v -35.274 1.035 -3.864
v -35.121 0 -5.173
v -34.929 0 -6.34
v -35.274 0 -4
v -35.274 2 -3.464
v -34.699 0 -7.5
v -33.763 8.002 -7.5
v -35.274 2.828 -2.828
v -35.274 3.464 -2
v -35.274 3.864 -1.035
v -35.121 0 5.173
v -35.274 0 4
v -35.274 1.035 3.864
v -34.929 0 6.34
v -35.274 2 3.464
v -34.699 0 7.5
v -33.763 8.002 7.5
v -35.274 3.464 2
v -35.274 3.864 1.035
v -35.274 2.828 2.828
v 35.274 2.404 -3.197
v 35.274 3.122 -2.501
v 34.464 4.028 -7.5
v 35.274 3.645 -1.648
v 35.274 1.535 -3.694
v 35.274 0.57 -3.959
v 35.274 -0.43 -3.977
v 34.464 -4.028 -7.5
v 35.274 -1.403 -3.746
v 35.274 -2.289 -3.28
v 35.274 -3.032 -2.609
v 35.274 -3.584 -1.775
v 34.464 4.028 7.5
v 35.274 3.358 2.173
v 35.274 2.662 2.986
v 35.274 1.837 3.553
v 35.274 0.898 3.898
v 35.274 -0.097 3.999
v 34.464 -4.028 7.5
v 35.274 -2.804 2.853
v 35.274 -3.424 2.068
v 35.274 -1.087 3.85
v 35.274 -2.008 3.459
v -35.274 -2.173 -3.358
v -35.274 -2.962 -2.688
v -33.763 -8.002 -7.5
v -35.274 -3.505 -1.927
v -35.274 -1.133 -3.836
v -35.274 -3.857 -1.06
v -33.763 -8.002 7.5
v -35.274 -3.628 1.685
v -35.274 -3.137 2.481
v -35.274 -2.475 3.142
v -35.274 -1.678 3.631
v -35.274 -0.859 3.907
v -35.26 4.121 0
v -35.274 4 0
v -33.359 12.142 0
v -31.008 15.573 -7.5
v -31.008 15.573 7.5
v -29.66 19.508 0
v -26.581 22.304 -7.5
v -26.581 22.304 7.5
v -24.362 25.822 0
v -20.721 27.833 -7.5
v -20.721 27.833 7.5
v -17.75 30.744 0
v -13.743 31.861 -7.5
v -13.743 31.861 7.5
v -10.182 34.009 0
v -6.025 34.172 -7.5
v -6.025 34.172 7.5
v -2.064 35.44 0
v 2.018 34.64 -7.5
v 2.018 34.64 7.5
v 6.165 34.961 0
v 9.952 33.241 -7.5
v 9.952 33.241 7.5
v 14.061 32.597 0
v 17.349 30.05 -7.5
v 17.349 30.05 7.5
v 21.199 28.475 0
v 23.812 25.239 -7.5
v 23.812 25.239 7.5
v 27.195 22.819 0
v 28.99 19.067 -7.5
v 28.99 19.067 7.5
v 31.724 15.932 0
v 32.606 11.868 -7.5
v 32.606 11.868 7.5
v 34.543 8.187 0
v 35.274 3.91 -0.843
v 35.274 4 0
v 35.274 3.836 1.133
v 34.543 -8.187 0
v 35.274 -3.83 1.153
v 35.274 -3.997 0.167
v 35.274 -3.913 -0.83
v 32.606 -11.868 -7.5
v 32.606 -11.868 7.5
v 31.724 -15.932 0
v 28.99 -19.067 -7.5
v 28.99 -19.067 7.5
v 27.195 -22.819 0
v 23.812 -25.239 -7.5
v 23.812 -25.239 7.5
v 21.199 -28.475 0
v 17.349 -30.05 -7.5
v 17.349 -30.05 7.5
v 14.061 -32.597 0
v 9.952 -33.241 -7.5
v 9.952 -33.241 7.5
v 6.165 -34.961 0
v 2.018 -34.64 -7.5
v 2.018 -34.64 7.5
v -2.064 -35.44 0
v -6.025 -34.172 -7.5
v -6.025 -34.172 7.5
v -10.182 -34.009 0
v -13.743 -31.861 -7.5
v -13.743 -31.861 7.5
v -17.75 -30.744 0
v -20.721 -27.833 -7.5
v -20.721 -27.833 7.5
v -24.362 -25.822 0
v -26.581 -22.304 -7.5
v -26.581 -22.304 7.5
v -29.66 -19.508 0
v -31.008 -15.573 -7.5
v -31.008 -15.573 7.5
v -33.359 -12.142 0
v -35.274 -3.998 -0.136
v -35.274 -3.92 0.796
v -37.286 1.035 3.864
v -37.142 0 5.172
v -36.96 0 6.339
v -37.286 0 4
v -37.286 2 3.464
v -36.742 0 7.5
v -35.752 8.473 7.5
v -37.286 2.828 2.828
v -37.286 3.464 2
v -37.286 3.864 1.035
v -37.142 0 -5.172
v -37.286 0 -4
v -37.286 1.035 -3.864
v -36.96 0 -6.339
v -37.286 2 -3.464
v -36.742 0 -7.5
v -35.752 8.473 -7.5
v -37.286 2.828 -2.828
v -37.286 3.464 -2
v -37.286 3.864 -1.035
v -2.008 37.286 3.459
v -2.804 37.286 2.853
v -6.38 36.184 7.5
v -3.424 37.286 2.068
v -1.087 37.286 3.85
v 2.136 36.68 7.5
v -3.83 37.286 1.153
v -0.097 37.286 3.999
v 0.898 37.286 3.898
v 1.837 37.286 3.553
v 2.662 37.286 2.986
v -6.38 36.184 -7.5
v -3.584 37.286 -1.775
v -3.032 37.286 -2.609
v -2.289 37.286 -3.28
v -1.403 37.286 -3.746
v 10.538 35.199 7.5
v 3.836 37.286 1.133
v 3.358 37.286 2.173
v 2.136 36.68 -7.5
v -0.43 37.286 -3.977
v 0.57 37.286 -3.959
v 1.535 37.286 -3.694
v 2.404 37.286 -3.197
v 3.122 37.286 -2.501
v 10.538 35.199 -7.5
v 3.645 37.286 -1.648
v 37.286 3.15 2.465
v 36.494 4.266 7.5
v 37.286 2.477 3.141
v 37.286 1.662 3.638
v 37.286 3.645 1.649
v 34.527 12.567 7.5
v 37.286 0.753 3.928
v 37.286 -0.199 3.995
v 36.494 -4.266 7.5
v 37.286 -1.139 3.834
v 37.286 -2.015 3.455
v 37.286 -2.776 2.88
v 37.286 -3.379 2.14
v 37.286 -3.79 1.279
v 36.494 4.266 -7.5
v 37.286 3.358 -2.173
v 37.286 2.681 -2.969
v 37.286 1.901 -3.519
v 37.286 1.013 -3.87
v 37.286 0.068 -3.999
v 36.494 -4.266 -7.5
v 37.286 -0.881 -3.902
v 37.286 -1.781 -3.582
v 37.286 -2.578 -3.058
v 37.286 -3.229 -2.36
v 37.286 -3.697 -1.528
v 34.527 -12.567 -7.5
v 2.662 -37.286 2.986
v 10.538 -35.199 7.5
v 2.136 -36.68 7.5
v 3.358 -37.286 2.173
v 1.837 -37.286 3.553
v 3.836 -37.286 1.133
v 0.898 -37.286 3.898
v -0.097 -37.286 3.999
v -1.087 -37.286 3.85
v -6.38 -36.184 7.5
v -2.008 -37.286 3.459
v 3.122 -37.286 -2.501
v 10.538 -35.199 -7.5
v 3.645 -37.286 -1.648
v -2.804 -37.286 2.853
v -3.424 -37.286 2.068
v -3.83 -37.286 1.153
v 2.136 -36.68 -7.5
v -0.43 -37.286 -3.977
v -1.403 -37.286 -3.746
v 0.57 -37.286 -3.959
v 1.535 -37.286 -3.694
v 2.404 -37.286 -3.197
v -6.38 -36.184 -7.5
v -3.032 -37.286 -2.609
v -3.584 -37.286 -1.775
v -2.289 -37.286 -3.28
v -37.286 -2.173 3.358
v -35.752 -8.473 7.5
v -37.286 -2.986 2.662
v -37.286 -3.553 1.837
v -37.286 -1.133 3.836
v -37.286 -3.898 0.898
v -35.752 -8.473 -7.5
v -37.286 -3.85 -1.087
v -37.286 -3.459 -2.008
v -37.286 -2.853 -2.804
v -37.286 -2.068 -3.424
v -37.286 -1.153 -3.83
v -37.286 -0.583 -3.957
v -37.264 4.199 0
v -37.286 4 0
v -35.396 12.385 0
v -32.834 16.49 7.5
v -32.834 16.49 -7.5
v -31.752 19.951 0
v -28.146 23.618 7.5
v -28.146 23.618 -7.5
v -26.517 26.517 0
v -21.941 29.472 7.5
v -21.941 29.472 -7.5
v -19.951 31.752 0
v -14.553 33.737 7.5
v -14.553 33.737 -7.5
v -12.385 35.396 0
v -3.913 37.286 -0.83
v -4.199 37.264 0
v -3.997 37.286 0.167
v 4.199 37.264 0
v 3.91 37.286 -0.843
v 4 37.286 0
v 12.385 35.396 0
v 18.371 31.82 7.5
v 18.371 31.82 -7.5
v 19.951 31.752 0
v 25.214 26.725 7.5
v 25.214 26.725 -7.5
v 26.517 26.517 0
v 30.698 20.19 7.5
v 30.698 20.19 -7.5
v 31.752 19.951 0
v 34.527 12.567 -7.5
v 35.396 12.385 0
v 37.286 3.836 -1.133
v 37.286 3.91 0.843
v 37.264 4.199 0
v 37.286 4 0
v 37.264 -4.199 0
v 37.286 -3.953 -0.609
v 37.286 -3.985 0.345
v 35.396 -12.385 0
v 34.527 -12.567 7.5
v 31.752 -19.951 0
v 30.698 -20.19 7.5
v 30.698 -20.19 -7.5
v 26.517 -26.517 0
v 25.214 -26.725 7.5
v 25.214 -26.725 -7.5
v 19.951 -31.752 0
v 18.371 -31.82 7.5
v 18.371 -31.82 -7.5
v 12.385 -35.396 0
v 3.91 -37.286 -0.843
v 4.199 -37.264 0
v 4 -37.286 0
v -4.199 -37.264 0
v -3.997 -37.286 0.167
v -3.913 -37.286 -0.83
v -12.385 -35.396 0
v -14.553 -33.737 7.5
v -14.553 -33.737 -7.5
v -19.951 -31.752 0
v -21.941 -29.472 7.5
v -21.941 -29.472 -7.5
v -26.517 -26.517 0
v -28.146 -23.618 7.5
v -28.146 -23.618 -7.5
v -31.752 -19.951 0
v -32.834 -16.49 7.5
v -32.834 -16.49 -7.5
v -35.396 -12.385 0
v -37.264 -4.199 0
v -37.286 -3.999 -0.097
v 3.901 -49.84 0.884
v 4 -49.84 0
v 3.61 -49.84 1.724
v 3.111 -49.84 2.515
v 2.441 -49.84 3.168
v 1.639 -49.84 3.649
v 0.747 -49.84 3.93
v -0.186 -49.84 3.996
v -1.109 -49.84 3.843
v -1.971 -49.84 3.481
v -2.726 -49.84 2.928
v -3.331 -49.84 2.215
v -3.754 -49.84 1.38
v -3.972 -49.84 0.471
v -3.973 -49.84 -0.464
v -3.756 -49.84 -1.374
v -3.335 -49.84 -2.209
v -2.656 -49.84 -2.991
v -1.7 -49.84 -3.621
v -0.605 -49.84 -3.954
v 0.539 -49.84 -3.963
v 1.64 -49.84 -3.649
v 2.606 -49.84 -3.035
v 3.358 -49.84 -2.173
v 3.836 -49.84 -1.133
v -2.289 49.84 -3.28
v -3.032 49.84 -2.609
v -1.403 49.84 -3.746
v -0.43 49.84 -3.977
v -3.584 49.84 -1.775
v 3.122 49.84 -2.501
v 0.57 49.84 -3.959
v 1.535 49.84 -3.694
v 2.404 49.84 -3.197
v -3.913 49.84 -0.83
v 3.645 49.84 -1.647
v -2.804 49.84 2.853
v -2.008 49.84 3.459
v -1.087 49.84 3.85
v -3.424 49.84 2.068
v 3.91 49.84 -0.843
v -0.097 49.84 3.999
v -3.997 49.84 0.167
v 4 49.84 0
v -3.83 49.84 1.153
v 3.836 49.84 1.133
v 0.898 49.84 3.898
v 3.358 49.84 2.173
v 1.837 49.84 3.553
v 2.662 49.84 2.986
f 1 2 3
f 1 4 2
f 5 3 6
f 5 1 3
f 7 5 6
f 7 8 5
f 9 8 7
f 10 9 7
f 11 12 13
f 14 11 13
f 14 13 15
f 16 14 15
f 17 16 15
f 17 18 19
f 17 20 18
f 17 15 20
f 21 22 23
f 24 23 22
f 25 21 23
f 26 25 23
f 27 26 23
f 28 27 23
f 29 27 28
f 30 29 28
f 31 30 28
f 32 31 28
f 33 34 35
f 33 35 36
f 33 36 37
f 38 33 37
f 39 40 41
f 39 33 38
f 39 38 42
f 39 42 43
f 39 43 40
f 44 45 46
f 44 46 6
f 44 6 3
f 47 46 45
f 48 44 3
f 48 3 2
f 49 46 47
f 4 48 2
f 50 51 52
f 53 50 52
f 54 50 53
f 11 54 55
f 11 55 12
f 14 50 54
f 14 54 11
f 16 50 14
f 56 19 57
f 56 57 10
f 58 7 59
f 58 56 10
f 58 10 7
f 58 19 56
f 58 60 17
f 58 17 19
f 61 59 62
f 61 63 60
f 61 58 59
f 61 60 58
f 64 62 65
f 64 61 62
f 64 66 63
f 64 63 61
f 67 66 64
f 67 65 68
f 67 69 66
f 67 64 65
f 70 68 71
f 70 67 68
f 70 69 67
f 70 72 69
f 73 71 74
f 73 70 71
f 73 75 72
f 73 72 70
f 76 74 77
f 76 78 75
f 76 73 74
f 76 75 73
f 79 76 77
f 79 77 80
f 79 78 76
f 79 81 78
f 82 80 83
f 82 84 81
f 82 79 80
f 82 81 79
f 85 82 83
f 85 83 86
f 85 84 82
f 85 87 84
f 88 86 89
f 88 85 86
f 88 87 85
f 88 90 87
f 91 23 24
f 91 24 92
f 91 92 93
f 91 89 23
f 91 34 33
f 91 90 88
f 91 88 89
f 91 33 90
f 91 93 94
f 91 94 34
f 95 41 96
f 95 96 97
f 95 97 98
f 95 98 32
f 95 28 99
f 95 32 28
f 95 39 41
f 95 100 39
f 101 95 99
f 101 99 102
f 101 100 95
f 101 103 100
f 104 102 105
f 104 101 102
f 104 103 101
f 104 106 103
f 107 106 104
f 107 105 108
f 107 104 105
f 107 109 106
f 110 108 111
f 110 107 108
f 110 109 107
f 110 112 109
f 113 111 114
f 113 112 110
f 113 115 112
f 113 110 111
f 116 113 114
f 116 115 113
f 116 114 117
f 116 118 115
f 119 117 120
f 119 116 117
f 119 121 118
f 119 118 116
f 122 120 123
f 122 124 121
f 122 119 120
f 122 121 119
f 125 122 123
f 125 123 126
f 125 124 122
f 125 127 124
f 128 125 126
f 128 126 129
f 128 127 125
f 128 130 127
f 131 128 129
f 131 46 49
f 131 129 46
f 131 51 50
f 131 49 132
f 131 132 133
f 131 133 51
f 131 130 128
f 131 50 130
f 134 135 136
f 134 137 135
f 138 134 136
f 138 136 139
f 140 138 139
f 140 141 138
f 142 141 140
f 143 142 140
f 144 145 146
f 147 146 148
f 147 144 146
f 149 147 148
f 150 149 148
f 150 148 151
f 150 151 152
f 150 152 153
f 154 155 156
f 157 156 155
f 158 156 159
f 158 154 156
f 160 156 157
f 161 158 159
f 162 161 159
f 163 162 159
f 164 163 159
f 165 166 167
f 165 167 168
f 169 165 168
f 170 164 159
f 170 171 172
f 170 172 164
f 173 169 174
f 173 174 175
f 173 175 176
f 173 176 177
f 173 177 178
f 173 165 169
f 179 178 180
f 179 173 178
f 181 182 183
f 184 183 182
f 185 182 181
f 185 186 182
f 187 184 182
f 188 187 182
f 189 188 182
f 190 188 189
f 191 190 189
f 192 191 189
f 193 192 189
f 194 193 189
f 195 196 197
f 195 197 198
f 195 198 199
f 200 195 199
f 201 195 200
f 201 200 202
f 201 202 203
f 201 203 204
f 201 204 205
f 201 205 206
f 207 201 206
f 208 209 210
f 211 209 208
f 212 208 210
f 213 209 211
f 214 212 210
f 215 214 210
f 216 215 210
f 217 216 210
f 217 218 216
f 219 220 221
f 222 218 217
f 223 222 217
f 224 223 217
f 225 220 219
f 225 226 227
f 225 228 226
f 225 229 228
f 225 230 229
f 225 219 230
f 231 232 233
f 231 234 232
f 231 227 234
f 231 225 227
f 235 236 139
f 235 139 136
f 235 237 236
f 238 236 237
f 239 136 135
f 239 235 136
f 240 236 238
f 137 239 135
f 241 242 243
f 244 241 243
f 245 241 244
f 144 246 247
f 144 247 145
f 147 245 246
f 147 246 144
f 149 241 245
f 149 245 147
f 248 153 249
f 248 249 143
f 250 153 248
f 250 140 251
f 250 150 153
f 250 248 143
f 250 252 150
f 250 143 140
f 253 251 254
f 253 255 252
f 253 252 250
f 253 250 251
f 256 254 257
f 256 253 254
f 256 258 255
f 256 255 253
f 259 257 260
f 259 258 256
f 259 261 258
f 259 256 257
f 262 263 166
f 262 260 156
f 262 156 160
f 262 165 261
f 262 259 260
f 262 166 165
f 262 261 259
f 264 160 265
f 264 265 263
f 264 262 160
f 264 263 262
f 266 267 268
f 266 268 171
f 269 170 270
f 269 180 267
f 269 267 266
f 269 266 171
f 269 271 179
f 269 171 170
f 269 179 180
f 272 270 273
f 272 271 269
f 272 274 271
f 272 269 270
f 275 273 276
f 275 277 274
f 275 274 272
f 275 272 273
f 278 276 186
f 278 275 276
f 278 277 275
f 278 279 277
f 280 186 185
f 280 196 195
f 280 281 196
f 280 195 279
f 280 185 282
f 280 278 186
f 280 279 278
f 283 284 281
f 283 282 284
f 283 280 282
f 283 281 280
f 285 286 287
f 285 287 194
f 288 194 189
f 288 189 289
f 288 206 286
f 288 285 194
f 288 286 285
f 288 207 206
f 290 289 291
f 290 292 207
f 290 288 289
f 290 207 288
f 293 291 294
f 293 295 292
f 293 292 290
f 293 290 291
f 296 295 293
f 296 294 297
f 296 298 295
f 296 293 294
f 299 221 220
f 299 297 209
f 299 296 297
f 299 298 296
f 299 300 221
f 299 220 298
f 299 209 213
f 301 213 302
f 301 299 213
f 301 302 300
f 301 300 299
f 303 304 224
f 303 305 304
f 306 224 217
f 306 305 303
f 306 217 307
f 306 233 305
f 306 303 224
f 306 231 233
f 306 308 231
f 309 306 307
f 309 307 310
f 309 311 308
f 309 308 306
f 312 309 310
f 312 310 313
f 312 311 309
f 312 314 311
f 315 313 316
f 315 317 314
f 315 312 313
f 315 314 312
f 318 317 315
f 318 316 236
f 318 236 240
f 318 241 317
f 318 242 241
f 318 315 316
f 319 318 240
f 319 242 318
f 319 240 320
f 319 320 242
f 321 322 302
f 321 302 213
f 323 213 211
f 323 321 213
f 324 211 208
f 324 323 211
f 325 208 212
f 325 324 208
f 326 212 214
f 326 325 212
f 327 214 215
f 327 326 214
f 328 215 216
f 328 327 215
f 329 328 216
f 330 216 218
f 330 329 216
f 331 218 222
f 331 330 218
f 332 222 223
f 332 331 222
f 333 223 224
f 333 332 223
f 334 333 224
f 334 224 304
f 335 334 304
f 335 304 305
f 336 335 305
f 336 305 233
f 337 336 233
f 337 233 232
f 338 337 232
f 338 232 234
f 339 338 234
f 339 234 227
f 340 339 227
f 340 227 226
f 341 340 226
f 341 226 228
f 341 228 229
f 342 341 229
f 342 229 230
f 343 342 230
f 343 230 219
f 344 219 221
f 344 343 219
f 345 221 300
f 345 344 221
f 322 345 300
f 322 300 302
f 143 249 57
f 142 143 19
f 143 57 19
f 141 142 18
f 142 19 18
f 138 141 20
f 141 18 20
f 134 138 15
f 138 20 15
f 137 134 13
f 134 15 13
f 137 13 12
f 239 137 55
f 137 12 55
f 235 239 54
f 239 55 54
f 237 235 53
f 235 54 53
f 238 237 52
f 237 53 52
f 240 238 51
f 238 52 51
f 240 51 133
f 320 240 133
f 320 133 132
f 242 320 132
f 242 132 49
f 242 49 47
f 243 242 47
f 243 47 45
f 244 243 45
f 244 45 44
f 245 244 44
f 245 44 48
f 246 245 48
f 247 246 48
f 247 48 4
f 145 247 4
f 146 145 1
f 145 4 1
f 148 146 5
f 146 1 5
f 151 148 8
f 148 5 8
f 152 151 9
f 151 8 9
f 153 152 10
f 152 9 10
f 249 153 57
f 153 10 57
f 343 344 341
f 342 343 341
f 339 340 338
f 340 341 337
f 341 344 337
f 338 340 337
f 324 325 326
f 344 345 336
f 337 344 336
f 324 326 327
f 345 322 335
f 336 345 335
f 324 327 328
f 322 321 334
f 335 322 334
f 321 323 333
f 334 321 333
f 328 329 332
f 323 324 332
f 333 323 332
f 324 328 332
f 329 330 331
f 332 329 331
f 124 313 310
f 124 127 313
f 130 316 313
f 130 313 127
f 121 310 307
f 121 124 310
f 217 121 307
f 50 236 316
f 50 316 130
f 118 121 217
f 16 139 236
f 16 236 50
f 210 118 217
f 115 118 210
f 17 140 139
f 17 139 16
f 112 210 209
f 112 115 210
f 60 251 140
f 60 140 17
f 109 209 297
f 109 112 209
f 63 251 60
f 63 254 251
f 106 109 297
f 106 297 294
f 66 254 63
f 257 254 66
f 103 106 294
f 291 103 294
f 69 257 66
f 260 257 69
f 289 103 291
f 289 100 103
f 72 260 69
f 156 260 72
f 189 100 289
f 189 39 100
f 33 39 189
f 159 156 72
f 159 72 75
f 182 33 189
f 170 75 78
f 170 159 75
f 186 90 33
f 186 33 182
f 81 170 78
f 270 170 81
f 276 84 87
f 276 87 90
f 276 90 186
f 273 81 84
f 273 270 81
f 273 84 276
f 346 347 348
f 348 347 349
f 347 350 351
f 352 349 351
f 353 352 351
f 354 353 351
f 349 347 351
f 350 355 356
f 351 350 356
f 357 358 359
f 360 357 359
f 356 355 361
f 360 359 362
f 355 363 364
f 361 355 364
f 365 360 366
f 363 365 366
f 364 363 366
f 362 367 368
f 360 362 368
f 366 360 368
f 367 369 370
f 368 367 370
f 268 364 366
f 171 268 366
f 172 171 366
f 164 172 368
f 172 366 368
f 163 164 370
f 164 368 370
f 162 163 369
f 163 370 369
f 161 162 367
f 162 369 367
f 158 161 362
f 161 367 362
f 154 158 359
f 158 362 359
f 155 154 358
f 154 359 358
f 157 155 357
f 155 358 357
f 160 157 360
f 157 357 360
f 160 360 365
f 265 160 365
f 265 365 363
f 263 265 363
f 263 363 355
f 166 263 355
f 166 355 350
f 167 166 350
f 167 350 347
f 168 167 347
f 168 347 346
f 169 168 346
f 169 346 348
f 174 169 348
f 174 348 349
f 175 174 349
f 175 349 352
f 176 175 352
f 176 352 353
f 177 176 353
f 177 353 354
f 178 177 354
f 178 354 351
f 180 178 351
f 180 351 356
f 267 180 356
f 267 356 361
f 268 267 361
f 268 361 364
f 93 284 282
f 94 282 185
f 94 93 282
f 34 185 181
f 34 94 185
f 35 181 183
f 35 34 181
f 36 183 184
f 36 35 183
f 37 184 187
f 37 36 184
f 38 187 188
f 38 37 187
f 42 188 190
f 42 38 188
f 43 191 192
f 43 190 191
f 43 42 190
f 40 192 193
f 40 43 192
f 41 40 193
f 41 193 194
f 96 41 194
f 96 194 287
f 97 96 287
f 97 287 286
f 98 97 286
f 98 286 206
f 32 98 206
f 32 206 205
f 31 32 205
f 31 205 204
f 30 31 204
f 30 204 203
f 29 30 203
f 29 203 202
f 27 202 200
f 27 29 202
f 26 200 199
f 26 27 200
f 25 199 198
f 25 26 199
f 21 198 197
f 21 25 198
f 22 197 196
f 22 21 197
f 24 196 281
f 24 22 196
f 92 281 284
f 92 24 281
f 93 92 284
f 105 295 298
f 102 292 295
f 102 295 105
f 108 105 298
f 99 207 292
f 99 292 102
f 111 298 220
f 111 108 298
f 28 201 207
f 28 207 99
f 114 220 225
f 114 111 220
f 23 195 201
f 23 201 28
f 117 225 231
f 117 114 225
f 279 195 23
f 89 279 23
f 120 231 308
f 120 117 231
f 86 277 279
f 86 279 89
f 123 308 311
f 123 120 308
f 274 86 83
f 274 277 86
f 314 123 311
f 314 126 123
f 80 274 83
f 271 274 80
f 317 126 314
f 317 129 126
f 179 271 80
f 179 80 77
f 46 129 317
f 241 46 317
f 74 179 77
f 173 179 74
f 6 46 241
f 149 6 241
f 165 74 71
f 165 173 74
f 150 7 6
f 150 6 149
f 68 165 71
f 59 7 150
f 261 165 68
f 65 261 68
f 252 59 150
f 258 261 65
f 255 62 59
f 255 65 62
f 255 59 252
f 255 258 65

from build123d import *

# Parameters (mm, degrees)
F2_R          = 4
F3_DEPTH      = 37.501
F3_DEPTH_BACK = 37.501
F5_R          = 4


with BuildPart() as f1:
    # F0 (on Front) → F1 (revolve)
    with BuildSketch(Plane.XZ):
        with BuildLine():
            Line((-34.6987031458, 7.5), (-36.7423461417, 7.5))
            ThreePointArc((-36.7423461417, 7.5), (-37.5, 0), (-36.7423461417, -7.5))
            Line((-36.7423461417, -7.5), (-34.6987031458, -7.5))
            ThreePointArc((-34.6987031458, -7.5), (-35.5, 0), (-34.6987031458, 7.5))
        make_face()
    revolve(axis=Axis((0, 0, 16.8621425897), (0, 0, -1)))

    # F2 (on Right) → F3 (cut, two sides)
    with BuildSketch(Plane.YZ) as f3_sk:
        Circle(F2_R)
    extrude(amount=-F3_DEPTH, mode=Mode.SUBTRACT)
    extrude(f3_sk.sketch, amount=F3_DEPTH_BACK, mode=Mode.SUBTRACT)

    # F5 (on offset) → F6 (join, up to the next surface of F1)
    with BuildSketch(Plane.XZ.offset(50)):
        Circle(F5_R)
    extrude(until=Until.NEXT, dir=(0, 1, 0))

    # F7: F1 across plane


with BuildPart() as f1_1:
    add(f1.part)
    add(f1.part.mirror(Plane.XZ))

    # F8 (on Right) → F9 (revolve, cut)
    with BuildSketch(Plane.YZ):
        with BuildLine():
            Line((0, 50), (0, 55))
            ThreePointArc((0, 55), (-55, 0), (0, -55))
            Line((0, -55), (0, -50))
            ThreePointArc((0, -50), (-50, 0), (0, 50))
        make_face()
    revolve(axis=Axis((0, 0, 27.5), (0, 0, -1)), mode=Mode.SUBTRACT)


solid = f1_1.part
